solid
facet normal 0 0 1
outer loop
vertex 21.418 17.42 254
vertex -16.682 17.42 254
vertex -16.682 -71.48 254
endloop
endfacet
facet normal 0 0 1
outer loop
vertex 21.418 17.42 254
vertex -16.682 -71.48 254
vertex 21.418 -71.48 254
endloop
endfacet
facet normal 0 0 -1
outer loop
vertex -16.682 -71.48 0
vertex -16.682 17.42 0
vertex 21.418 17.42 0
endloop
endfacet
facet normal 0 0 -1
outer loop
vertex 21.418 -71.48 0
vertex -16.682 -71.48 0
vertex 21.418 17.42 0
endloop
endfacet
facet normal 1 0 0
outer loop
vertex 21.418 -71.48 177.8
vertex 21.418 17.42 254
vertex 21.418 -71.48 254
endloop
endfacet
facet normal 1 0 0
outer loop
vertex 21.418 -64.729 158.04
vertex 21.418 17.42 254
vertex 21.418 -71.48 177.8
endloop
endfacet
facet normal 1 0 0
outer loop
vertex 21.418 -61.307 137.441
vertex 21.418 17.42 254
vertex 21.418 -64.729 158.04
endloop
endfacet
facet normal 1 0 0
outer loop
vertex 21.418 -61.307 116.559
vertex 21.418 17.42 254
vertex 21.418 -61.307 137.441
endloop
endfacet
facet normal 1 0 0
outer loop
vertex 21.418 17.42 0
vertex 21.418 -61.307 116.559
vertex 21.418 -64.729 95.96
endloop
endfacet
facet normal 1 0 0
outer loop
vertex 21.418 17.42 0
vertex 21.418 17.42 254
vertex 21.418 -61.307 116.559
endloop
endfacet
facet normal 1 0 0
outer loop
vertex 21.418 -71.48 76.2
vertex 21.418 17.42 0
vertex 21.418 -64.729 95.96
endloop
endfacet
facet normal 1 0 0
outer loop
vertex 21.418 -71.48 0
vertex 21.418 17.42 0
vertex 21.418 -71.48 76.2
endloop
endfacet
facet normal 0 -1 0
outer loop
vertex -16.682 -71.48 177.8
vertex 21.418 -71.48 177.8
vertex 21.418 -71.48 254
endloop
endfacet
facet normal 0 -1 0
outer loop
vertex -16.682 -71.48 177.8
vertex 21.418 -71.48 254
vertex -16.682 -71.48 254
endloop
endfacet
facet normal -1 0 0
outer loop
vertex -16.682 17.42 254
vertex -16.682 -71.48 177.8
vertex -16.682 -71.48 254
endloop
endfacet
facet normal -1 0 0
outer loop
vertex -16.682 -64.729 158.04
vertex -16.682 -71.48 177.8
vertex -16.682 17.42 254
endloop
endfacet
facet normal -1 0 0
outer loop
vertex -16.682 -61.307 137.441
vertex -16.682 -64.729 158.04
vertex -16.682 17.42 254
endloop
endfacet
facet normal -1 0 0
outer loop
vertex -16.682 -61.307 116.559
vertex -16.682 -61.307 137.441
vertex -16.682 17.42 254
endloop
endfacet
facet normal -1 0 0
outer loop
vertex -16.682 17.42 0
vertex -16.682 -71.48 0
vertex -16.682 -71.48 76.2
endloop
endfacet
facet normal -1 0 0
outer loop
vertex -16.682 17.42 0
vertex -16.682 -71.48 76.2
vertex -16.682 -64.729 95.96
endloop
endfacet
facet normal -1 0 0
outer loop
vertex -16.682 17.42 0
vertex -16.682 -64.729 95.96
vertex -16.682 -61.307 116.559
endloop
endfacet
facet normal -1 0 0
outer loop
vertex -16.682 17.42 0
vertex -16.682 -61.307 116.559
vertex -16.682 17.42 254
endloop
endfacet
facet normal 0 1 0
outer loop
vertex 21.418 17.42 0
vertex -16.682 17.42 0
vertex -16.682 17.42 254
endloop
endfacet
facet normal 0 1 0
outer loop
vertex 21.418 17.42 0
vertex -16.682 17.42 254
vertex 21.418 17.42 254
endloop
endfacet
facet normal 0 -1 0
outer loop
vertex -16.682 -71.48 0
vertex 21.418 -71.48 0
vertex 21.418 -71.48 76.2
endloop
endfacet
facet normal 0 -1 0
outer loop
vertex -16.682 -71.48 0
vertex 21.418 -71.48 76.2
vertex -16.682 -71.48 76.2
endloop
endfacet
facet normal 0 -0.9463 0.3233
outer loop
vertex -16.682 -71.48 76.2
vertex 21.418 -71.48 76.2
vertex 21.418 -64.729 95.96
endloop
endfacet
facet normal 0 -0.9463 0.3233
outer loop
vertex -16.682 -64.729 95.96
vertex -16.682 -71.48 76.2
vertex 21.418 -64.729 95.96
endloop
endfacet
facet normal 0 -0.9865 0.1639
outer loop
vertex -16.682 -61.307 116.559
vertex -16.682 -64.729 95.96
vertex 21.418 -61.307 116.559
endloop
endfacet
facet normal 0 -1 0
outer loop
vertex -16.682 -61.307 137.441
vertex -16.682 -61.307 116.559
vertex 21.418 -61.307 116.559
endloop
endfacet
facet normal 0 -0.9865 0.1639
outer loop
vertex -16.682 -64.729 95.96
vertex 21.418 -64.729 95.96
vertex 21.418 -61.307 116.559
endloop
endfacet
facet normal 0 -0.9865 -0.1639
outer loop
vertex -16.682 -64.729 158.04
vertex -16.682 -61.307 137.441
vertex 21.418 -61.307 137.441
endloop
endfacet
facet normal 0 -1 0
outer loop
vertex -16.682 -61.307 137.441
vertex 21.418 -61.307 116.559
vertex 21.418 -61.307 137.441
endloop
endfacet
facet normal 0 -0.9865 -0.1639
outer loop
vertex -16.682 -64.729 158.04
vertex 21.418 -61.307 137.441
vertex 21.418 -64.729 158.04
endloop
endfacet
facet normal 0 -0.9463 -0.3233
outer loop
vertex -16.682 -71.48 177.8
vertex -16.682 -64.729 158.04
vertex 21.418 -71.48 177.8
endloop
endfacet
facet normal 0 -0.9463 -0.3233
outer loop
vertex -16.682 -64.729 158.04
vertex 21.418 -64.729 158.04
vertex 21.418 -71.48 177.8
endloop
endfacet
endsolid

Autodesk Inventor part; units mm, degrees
ref_plane "YZ Plane" through (0, 0, 0) normal (1, 0, 0) x (0, 1, 0)
ref_plane "XZ Plane" through (0, 0, 0) normal (0, 1, 0) x (-1, 0, 0)
ref_plane "XY Plane" through (0, 0, 0) normal (0, 0, 1) x (1, 0, 0)
sketch "Sketch1" plane through (0, 0, 0) normal (0, 0, 1) x (1, 0, 0)
  line L0 (-16.6819, 17.4202) -> (21.4181, 17.4202)
  line L1 (21.4181, 17.4202) -> (21.4181, -71.4798)
  line L2 (21.4181, -71.4798) -> (-16.6819, -71.4798)
  line L3 (-16.6819, -71.4798) -> (-16.6819, 17.4202)
  point P0 (0, 0)
  dimension "d0" = 38.1
  dimension "d1" = 88.9
extrude "Extrusion1" add sketch "Sketch1" along normal blind 254
sketch "Sketch2" plane through (21.4181, -71.4798, 0) normal (1, 0, 0) x (0, 0, -1)
  line L0 (0, 0) -> (-254, 0) projected
  arc A0 (-76.2, 0) -> (-177.8, 0) centre (-127, -116.3974) ccw
  point P0 (0, 71.4798)
  dimension "d4" = 127
  dimension "d5" = 76.2
  dimension "d6" = 76.2
extrude "Extrusion2" cut sketch "Sketch2" against normal blind 76.2
equation "\"d6\" = d5"
properties part number "RailMount2x4_NERDS"
